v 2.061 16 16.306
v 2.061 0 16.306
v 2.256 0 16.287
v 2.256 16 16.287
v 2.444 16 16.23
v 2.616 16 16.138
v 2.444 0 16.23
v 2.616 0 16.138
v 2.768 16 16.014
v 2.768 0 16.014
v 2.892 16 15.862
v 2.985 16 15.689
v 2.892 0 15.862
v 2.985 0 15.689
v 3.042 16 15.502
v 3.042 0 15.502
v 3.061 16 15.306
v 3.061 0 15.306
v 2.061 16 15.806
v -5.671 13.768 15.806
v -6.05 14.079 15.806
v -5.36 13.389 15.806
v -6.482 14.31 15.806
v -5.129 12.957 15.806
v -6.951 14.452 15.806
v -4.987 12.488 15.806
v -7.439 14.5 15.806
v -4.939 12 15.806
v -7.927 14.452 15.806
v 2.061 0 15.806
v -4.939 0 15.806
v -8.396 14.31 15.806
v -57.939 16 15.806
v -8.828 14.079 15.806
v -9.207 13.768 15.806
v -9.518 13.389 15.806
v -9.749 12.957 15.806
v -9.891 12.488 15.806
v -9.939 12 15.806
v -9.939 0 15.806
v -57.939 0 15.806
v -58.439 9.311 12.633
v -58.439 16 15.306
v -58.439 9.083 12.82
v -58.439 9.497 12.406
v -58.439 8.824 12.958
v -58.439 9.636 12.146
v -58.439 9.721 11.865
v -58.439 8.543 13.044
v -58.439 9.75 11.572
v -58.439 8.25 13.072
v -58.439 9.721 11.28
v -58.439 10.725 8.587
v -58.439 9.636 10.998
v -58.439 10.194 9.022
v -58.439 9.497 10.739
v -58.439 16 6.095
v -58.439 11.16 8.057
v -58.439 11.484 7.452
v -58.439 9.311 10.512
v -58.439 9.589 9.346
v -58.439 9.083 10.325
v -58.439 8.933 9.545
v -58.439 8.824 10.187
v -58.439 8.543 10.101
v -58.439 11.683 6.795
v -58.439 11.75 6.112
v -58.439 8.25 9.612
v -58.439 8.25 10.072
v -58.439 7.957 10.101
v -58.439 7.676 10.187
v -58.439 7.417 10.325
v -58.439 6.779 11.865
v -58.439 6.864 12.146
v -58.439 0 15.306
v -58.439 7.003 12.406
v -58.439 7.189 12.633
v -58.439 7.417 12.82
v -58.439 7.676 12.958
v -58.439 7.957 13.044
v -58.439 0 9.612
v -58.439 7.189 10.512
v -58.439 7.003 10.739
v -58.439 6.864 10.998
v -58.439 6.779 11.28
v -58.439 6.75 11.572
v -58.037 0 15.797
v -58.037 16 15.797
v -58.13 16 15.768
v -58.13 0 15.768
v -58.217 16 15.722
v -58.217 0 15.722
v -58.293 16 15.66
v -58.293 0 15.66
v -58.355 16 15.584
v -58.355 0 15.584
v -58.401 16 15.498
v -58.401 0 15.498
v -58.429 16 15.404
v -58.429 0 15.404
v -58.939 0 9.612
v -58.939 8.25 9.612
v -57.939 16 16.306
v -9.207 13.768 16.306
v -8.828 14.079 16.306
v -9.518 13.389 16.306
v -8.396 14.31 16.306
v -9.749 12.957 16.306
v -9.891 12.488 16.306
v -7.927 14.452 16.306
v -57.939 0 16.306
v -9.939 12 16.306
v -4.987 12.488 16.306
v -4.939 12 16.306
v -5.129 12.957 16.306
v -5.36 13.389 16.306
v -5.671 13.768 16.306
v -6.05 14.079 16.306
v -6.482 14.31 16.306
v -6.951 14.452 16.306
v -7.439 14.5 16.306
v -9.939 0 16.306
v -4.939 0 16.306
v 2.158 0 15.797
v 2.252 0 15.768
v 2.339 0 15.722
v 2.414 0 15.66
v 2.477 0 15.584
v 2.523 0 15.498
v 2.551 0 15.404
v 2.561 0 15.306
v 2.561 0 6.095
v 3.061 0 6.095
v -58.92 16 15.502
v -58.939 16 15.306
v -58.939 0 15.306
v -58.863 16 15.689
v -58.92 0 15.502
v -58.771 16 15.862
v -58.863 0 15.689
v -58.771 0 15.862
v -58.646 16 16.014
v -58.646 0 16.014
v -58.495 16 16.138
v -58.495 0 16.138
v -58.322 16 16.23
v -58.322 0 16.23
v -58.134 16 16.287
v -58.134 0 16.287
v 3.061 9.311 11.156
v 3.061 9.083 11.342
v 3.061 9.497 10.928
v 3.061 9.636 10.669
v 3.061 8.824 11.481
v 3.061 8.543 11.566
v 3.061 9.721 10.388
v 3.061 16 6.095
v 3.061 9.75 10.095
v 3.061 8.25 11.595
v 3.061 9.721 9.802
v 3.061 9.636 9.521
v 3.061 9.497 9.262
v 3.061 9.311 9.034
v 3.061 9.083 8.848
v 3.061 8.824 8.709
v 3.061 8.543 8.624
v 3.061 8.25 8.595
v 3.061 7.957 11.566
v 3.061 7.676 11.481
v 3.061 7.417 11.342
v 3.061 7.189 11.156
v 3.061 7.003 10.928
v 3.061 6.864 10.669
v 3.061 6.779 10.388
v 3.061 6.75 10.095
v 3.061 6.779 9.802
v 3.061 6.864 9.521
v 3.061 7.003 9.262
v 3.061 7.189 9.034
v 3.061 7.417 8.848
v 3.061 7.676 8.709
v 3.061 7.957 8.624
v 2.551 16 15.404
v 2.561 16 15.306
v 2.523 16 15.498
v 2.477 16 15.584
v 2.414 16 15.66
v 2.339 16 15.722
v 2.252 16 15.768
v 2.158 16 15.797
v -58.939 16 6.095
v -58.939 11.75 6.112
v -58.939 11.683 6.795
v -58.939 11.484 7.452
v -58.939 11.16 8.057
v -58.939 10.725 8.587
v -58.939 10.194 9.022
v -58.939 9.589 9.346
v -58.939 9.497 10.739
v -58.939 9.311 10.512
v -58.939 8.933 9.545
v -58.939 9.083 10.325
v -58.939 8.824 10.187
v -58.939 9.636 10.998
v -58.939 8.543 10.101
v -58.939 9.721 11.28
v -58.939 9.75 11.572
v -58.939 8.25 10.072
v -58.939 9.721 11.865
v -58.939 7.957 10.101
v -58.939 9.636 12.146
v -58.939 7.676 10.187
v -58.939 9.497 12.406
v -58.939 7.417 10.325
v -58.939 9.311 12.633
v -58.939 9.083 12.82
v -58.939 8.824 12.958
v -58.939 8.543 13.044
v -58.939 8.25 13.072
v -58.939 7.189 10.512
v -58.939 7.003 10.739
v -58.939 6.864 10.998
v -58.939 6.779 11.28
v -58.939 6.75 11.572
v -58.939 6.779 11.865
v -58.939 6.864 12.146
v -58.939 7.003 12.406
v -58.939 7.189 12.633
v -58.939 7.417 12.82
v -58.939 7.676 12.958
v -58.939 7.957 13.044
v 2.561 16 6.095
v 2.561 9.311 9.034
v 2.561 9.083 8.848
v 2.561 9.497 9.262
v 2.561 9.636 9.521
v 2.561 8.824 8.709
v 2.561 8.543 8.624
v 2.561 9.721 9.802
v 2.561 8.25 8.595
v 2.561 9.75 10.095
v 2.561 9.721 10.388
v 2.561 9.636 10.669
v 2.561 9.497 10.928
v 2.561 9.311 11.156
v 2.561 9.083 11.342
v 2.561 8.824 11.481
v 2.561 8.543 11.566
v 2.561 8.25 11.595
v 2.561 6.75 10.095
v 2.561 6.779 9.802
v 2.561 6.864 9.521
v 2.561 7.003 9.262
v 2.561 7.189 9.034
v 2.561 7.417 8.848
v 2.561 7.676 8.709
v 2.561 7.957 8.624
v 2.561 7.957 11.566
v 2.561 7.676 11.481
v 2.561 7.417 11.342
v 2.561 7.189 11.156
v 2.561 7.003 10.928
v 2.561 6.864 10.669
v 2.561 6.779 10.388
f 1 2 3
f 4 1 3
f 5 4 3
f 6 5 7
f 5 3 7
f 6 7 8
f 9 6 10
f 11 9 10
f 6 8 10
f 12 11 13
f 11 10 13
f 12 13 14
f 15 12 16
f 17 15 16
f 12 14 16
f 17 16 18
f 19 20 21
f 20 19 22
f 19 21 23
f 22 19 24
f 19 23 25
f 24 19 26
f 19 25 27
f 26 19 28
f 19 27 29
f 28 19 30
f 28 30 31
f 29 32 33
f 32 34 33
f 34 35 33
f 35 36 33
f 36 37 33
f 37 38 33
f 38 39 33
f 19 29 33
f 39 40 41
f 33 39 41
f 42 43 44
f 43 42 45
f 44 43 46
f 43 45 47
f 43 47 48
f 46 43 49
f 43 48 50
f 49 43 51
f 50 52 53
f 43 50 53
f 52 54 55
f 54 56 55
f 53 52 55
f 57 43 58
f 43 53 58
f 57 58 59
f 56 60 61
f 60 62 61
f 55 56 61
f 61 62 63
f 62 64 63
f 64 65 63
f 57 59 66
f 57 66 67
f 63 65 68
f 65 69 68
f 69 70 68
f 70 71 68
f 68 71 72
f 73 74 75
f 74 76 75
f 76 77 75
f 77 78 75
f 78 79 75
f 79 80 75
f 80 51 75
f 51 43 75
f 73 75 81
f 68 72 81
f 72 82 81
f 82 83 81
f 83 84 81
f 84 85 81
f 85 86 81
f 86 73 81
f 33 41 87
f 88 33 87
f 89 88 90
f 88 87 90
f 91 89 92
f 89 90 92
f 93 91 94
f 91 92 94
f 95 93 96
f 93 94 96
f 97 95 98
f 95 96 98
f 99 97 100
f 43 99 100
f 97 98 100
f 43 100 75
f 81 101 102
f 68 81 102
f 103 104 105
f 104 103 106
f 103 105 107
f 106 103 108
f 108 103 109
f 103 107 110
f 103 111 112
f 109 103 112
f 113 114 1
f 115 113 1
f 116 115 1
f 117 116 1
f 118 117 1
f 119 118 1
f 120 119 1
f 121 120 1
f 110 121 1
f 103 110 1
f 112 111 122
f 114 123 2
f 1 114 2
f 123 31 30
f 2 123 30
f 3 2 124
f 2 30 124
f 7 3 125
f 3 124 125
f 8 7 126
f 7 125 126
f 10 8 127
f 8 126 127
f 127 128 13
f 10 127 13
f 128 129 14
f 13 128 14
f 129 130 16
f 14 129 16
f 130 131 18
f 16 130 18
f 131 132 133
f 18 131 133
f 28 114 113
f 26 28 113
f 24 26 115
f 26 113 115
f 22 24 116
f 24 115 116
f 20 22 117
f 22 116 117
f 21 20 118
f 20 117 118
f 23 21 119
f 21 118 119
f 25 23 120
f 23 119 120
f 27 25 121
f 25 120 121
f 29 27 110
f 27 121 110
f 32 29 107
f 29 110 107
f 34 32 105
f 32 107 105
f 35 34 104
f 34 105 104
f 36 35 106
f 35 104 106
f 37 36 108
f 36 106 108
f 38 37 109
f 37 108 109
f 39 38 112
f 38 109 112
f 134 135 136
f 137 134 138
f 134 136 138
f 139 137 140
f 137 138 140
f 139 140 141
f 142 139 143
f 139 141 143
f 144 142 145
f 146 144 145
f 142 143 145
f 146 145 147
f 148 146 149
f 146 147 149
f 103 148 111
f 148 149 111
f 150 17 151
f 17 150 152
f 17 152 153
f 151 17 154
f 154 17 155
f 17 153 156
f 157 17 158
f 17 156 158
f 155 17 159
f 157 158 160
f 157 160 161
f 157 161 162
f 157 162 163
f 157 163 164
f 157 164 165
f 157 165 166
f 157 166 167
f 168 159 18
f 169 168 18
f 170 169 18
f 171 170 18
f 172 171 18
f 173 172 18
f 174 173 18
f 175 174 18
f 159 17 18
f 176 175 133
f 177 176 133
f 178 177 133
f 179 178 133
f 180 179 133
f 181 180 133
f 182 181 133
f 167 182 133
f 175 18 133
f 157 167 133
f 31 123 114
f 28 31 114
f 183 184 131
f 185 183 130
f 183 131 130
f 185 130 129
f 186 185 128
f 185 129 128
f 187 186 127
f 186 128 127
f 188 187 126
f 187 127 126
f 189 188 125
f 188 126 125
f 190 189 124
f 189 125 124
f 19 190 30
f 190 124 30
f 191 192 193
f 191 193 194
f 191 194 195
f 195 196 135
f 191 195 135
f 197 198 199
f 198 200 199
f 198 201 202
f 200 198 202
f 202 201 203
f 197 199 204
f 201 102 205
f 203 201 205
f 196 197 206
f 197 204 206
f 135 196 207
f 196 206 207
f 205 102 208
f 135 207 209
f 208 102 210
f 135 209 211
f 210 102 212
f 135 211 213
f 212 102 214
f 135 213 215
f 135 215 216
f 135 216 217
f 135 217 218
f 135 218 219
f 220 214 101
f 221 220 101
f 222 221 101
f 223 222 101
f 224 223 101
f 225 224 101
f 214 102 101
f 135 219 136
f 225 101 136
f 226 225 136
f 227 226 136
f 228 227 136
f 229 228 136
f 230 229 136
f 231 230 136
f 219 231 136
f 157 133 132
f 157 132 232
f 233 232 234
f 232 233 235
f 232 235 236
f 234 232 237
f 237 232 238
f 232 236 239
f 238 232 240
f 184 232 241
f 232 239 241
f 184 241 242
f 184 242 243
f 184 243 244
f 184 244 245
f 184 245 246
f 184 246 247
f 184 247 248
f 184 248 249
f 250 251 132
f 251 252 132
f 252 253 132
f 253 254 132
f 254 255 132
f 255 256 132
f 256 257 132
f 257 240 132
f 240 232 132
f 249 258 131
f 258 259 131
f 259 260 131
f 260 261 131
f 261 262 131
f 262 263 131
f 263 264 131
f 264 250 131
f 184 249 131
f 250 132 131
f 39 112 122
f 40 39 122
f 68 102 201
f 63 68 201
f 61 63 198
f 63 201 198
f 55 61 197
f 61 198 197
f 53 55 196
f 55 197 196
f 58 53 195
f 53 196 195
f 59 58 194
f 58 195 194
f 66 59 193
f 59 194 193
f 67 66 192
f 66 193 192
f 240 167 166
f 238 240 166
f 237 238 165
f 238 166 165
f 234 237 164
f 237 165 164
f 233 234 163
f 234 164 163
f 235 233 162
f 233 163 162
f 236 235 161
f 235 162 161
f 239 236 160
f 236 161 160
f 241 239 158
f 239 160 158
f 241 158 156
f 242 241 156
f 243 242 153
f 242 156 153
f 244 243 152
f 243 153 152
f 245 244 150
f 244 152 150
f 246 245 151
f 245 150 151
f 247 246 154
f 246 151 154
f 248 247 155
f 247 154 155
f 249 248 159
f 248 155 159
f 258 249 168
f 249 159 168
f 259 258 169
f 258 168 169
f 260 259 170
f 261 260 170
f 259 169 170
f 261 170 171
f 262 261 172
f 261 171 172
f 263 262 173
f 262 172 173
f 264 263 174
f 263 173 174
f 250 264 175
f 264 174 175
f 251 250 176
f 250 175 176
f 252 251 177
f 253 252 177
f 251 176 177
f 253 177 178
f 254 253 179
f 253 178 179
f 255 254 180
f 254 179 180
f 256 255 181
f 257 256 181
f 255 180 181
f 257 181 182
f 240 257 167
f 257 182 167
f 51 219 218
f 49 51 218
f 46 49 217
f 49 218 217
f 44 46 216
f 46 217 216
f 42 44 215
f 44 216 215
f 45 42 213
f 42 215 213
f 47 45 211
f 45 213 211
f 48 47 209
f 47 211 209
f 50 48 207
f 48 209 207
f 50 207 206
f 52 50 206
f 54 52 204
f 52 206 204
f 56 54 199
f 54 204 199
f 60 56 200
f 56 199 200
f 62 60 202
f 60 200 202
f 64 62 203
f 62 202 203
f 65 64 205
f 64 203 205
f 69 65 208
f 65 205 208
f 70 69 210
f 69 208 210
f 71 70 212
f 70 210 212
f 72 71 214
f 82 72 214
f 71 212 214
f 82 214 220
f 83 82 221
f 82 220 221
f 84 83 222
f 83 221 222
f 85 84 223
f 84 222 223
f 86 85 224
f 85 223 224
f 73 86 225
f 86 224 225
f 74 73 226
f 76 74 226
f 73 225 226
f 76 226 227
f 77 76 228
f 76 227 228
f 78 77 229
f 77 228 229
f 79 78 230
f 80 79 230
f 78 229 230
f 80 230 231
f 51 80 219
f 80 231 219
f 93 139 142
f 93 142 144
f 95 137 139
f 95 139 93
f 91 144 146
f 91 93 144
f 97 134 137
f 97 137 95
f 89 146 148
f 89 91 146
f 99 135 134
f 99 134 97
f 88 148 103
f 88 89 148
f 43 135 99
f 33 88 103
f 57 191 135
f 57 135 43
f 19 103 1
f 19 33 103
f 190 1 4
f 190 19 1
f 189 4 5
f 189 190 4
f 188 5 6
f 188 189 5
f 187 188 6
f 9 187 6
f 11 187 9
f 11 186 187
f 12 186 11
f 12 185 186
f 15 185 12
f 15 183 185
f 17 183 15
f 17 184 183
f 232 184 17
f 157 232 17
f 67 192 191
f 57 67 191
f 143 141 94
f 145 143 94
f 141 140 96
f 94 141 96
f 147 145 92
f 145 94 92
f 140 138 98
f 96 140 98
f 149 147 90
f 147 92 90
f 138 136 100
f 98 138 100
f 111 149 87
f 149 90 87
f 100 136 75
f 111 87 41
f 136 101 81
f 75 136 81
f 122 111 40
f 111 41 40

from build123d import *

# Parameters (mm, degrees)
BRIDA_BASE1_DEPTH      = 16
CROQUIS6_R             = 1.5
CROQUIS6_W             = 9.788625446
CROQUIS6_H             = 16
CORTAR_EXTRUIR8_DEPTH  = 0.5
CROQUIS10_R            = 1.5
CORTAR_EXTRUIR10_DEPTH = 0.5
CORTAR_EXTRUIR11_DEPTH = 0.5


# Sheet-metal steps are written as plain solids
with BuildPart() as part:
    # Croquis1 → Brida base1 (new body)
    with BuildSketch(Plane(origin=(0, 0, 0), x_dir=(1, 0, 0), z_dir=(0, 1, 0))):
        with BuildLine():
            Line((-58.939086294, 3.693519459), (-58.939086294, -15.306480541))
            ThreePointArc((-58.939086294, -15.306480541), (-58.646193076, -16.013587323), (-57.939086294, -16.306480541))
            Line((-57.939086294, -16.306480541), (2.060913706, -16.306480541))
            ThreePointArc((2.060913706, -16.306480541), (2.768020487, -16.013587323), (3.060913706, -15.306480541))
            Line((3.060913706, -15.306480541), (3.060913706, 3.693519459))
            Line((3.060913706, 3.693519459), (2.560913706, 3.693519459))
            Line((2.560913706, 3.693519459), (2.560913706, -15.306480541))
            ThreePointArc((2.560913706, -15.306480541), (2.414467096, -15.660033932), (2.060913706, -15.806480541))
            Line((2.060913706, -15.806480541), (-57.939086294, -15.806480541))
            ThreePointArc((-57.939086294, -15.806480541), (-58.292639685, -15.660033932), (-58.439086294, -15.306480541))
            Line((-58.439086294, -15.306480541), (-58.439086294, 3.693519459))
            Line((-58.439086294, 3.693519459), (-58.939086294, 3.693519459))
        make_face()
    extrude(amount=BRIDA_BASE1_DEPTH)

    # Croquis6 → Cortar-Extruir8 (cut)
    with BuildSketch(Plane(origin=(3.060913706, 0, 0), x_dir=(0, 0, -1), z_dir=(1, 0, 0))):
        with Locations((-10.095105987, 8.25)):
            Circle(CROQUIS6_R)
        with Locations((-1.200793264, 8)):
            Rectangle(CROQUIS6_W, CROQUIS6_H)
    extrude(amount=-CORTAR_EXTRUIR8_DEPTH, mode=Mode.SUBTRACT)

    # Croquis10 → Cortar-Extruir10 (cut)
    with BuildSketch(Plane.ZY.offset(58.939086294)):
        with BuildLine():
            Line((6.112352523, 11.75), (6.095105987, 16))
            Line((6.095105987, 16), (-3.693519459, 16))
            Line((-3.693519459, 16), (-3.693519459, 0))
            Line((-3.693519459, 0), (6.095105987, 0))
            Line((6.095105987, 0), (9.612352523, 0))
            Line((9.612352523, 0), (9.612352523, 8.25))
            ThreePointArc((9.612352523, 8.25), (8.587226257, 10.724873734), (6.112352523, 11.75))
        make_face()
        with Locations((11.572352523, 8.25)):
            Circle(CROQUIS10_R)
    extrude(amount=-CORTAR_EXTRUIR10_DEPTH, mode=Mode.SUBTRACT)

    # Croquis11 → Cortar-Extruir11 (cut)
    with BuildSketch(Plane.XY.offset(16.306480541)):
        with BuildLine():
            Line((-9.939086294, 12), (-9.939086294, 0))
            Line((-9.939086294, 0), (-4.939086294, 0))
            Line((-4.939086294, 0), (-4.939086294, 12))
            ThreePointArc((-4.939086294, 12), (-7.439086294, 14.5), (-9.939086294, 12))
        make_face()
    extrude(amount=-CORTAR_EXTRUIR11_DEPTH, mode=Mode.SUBTRACT)


solid = part.part
